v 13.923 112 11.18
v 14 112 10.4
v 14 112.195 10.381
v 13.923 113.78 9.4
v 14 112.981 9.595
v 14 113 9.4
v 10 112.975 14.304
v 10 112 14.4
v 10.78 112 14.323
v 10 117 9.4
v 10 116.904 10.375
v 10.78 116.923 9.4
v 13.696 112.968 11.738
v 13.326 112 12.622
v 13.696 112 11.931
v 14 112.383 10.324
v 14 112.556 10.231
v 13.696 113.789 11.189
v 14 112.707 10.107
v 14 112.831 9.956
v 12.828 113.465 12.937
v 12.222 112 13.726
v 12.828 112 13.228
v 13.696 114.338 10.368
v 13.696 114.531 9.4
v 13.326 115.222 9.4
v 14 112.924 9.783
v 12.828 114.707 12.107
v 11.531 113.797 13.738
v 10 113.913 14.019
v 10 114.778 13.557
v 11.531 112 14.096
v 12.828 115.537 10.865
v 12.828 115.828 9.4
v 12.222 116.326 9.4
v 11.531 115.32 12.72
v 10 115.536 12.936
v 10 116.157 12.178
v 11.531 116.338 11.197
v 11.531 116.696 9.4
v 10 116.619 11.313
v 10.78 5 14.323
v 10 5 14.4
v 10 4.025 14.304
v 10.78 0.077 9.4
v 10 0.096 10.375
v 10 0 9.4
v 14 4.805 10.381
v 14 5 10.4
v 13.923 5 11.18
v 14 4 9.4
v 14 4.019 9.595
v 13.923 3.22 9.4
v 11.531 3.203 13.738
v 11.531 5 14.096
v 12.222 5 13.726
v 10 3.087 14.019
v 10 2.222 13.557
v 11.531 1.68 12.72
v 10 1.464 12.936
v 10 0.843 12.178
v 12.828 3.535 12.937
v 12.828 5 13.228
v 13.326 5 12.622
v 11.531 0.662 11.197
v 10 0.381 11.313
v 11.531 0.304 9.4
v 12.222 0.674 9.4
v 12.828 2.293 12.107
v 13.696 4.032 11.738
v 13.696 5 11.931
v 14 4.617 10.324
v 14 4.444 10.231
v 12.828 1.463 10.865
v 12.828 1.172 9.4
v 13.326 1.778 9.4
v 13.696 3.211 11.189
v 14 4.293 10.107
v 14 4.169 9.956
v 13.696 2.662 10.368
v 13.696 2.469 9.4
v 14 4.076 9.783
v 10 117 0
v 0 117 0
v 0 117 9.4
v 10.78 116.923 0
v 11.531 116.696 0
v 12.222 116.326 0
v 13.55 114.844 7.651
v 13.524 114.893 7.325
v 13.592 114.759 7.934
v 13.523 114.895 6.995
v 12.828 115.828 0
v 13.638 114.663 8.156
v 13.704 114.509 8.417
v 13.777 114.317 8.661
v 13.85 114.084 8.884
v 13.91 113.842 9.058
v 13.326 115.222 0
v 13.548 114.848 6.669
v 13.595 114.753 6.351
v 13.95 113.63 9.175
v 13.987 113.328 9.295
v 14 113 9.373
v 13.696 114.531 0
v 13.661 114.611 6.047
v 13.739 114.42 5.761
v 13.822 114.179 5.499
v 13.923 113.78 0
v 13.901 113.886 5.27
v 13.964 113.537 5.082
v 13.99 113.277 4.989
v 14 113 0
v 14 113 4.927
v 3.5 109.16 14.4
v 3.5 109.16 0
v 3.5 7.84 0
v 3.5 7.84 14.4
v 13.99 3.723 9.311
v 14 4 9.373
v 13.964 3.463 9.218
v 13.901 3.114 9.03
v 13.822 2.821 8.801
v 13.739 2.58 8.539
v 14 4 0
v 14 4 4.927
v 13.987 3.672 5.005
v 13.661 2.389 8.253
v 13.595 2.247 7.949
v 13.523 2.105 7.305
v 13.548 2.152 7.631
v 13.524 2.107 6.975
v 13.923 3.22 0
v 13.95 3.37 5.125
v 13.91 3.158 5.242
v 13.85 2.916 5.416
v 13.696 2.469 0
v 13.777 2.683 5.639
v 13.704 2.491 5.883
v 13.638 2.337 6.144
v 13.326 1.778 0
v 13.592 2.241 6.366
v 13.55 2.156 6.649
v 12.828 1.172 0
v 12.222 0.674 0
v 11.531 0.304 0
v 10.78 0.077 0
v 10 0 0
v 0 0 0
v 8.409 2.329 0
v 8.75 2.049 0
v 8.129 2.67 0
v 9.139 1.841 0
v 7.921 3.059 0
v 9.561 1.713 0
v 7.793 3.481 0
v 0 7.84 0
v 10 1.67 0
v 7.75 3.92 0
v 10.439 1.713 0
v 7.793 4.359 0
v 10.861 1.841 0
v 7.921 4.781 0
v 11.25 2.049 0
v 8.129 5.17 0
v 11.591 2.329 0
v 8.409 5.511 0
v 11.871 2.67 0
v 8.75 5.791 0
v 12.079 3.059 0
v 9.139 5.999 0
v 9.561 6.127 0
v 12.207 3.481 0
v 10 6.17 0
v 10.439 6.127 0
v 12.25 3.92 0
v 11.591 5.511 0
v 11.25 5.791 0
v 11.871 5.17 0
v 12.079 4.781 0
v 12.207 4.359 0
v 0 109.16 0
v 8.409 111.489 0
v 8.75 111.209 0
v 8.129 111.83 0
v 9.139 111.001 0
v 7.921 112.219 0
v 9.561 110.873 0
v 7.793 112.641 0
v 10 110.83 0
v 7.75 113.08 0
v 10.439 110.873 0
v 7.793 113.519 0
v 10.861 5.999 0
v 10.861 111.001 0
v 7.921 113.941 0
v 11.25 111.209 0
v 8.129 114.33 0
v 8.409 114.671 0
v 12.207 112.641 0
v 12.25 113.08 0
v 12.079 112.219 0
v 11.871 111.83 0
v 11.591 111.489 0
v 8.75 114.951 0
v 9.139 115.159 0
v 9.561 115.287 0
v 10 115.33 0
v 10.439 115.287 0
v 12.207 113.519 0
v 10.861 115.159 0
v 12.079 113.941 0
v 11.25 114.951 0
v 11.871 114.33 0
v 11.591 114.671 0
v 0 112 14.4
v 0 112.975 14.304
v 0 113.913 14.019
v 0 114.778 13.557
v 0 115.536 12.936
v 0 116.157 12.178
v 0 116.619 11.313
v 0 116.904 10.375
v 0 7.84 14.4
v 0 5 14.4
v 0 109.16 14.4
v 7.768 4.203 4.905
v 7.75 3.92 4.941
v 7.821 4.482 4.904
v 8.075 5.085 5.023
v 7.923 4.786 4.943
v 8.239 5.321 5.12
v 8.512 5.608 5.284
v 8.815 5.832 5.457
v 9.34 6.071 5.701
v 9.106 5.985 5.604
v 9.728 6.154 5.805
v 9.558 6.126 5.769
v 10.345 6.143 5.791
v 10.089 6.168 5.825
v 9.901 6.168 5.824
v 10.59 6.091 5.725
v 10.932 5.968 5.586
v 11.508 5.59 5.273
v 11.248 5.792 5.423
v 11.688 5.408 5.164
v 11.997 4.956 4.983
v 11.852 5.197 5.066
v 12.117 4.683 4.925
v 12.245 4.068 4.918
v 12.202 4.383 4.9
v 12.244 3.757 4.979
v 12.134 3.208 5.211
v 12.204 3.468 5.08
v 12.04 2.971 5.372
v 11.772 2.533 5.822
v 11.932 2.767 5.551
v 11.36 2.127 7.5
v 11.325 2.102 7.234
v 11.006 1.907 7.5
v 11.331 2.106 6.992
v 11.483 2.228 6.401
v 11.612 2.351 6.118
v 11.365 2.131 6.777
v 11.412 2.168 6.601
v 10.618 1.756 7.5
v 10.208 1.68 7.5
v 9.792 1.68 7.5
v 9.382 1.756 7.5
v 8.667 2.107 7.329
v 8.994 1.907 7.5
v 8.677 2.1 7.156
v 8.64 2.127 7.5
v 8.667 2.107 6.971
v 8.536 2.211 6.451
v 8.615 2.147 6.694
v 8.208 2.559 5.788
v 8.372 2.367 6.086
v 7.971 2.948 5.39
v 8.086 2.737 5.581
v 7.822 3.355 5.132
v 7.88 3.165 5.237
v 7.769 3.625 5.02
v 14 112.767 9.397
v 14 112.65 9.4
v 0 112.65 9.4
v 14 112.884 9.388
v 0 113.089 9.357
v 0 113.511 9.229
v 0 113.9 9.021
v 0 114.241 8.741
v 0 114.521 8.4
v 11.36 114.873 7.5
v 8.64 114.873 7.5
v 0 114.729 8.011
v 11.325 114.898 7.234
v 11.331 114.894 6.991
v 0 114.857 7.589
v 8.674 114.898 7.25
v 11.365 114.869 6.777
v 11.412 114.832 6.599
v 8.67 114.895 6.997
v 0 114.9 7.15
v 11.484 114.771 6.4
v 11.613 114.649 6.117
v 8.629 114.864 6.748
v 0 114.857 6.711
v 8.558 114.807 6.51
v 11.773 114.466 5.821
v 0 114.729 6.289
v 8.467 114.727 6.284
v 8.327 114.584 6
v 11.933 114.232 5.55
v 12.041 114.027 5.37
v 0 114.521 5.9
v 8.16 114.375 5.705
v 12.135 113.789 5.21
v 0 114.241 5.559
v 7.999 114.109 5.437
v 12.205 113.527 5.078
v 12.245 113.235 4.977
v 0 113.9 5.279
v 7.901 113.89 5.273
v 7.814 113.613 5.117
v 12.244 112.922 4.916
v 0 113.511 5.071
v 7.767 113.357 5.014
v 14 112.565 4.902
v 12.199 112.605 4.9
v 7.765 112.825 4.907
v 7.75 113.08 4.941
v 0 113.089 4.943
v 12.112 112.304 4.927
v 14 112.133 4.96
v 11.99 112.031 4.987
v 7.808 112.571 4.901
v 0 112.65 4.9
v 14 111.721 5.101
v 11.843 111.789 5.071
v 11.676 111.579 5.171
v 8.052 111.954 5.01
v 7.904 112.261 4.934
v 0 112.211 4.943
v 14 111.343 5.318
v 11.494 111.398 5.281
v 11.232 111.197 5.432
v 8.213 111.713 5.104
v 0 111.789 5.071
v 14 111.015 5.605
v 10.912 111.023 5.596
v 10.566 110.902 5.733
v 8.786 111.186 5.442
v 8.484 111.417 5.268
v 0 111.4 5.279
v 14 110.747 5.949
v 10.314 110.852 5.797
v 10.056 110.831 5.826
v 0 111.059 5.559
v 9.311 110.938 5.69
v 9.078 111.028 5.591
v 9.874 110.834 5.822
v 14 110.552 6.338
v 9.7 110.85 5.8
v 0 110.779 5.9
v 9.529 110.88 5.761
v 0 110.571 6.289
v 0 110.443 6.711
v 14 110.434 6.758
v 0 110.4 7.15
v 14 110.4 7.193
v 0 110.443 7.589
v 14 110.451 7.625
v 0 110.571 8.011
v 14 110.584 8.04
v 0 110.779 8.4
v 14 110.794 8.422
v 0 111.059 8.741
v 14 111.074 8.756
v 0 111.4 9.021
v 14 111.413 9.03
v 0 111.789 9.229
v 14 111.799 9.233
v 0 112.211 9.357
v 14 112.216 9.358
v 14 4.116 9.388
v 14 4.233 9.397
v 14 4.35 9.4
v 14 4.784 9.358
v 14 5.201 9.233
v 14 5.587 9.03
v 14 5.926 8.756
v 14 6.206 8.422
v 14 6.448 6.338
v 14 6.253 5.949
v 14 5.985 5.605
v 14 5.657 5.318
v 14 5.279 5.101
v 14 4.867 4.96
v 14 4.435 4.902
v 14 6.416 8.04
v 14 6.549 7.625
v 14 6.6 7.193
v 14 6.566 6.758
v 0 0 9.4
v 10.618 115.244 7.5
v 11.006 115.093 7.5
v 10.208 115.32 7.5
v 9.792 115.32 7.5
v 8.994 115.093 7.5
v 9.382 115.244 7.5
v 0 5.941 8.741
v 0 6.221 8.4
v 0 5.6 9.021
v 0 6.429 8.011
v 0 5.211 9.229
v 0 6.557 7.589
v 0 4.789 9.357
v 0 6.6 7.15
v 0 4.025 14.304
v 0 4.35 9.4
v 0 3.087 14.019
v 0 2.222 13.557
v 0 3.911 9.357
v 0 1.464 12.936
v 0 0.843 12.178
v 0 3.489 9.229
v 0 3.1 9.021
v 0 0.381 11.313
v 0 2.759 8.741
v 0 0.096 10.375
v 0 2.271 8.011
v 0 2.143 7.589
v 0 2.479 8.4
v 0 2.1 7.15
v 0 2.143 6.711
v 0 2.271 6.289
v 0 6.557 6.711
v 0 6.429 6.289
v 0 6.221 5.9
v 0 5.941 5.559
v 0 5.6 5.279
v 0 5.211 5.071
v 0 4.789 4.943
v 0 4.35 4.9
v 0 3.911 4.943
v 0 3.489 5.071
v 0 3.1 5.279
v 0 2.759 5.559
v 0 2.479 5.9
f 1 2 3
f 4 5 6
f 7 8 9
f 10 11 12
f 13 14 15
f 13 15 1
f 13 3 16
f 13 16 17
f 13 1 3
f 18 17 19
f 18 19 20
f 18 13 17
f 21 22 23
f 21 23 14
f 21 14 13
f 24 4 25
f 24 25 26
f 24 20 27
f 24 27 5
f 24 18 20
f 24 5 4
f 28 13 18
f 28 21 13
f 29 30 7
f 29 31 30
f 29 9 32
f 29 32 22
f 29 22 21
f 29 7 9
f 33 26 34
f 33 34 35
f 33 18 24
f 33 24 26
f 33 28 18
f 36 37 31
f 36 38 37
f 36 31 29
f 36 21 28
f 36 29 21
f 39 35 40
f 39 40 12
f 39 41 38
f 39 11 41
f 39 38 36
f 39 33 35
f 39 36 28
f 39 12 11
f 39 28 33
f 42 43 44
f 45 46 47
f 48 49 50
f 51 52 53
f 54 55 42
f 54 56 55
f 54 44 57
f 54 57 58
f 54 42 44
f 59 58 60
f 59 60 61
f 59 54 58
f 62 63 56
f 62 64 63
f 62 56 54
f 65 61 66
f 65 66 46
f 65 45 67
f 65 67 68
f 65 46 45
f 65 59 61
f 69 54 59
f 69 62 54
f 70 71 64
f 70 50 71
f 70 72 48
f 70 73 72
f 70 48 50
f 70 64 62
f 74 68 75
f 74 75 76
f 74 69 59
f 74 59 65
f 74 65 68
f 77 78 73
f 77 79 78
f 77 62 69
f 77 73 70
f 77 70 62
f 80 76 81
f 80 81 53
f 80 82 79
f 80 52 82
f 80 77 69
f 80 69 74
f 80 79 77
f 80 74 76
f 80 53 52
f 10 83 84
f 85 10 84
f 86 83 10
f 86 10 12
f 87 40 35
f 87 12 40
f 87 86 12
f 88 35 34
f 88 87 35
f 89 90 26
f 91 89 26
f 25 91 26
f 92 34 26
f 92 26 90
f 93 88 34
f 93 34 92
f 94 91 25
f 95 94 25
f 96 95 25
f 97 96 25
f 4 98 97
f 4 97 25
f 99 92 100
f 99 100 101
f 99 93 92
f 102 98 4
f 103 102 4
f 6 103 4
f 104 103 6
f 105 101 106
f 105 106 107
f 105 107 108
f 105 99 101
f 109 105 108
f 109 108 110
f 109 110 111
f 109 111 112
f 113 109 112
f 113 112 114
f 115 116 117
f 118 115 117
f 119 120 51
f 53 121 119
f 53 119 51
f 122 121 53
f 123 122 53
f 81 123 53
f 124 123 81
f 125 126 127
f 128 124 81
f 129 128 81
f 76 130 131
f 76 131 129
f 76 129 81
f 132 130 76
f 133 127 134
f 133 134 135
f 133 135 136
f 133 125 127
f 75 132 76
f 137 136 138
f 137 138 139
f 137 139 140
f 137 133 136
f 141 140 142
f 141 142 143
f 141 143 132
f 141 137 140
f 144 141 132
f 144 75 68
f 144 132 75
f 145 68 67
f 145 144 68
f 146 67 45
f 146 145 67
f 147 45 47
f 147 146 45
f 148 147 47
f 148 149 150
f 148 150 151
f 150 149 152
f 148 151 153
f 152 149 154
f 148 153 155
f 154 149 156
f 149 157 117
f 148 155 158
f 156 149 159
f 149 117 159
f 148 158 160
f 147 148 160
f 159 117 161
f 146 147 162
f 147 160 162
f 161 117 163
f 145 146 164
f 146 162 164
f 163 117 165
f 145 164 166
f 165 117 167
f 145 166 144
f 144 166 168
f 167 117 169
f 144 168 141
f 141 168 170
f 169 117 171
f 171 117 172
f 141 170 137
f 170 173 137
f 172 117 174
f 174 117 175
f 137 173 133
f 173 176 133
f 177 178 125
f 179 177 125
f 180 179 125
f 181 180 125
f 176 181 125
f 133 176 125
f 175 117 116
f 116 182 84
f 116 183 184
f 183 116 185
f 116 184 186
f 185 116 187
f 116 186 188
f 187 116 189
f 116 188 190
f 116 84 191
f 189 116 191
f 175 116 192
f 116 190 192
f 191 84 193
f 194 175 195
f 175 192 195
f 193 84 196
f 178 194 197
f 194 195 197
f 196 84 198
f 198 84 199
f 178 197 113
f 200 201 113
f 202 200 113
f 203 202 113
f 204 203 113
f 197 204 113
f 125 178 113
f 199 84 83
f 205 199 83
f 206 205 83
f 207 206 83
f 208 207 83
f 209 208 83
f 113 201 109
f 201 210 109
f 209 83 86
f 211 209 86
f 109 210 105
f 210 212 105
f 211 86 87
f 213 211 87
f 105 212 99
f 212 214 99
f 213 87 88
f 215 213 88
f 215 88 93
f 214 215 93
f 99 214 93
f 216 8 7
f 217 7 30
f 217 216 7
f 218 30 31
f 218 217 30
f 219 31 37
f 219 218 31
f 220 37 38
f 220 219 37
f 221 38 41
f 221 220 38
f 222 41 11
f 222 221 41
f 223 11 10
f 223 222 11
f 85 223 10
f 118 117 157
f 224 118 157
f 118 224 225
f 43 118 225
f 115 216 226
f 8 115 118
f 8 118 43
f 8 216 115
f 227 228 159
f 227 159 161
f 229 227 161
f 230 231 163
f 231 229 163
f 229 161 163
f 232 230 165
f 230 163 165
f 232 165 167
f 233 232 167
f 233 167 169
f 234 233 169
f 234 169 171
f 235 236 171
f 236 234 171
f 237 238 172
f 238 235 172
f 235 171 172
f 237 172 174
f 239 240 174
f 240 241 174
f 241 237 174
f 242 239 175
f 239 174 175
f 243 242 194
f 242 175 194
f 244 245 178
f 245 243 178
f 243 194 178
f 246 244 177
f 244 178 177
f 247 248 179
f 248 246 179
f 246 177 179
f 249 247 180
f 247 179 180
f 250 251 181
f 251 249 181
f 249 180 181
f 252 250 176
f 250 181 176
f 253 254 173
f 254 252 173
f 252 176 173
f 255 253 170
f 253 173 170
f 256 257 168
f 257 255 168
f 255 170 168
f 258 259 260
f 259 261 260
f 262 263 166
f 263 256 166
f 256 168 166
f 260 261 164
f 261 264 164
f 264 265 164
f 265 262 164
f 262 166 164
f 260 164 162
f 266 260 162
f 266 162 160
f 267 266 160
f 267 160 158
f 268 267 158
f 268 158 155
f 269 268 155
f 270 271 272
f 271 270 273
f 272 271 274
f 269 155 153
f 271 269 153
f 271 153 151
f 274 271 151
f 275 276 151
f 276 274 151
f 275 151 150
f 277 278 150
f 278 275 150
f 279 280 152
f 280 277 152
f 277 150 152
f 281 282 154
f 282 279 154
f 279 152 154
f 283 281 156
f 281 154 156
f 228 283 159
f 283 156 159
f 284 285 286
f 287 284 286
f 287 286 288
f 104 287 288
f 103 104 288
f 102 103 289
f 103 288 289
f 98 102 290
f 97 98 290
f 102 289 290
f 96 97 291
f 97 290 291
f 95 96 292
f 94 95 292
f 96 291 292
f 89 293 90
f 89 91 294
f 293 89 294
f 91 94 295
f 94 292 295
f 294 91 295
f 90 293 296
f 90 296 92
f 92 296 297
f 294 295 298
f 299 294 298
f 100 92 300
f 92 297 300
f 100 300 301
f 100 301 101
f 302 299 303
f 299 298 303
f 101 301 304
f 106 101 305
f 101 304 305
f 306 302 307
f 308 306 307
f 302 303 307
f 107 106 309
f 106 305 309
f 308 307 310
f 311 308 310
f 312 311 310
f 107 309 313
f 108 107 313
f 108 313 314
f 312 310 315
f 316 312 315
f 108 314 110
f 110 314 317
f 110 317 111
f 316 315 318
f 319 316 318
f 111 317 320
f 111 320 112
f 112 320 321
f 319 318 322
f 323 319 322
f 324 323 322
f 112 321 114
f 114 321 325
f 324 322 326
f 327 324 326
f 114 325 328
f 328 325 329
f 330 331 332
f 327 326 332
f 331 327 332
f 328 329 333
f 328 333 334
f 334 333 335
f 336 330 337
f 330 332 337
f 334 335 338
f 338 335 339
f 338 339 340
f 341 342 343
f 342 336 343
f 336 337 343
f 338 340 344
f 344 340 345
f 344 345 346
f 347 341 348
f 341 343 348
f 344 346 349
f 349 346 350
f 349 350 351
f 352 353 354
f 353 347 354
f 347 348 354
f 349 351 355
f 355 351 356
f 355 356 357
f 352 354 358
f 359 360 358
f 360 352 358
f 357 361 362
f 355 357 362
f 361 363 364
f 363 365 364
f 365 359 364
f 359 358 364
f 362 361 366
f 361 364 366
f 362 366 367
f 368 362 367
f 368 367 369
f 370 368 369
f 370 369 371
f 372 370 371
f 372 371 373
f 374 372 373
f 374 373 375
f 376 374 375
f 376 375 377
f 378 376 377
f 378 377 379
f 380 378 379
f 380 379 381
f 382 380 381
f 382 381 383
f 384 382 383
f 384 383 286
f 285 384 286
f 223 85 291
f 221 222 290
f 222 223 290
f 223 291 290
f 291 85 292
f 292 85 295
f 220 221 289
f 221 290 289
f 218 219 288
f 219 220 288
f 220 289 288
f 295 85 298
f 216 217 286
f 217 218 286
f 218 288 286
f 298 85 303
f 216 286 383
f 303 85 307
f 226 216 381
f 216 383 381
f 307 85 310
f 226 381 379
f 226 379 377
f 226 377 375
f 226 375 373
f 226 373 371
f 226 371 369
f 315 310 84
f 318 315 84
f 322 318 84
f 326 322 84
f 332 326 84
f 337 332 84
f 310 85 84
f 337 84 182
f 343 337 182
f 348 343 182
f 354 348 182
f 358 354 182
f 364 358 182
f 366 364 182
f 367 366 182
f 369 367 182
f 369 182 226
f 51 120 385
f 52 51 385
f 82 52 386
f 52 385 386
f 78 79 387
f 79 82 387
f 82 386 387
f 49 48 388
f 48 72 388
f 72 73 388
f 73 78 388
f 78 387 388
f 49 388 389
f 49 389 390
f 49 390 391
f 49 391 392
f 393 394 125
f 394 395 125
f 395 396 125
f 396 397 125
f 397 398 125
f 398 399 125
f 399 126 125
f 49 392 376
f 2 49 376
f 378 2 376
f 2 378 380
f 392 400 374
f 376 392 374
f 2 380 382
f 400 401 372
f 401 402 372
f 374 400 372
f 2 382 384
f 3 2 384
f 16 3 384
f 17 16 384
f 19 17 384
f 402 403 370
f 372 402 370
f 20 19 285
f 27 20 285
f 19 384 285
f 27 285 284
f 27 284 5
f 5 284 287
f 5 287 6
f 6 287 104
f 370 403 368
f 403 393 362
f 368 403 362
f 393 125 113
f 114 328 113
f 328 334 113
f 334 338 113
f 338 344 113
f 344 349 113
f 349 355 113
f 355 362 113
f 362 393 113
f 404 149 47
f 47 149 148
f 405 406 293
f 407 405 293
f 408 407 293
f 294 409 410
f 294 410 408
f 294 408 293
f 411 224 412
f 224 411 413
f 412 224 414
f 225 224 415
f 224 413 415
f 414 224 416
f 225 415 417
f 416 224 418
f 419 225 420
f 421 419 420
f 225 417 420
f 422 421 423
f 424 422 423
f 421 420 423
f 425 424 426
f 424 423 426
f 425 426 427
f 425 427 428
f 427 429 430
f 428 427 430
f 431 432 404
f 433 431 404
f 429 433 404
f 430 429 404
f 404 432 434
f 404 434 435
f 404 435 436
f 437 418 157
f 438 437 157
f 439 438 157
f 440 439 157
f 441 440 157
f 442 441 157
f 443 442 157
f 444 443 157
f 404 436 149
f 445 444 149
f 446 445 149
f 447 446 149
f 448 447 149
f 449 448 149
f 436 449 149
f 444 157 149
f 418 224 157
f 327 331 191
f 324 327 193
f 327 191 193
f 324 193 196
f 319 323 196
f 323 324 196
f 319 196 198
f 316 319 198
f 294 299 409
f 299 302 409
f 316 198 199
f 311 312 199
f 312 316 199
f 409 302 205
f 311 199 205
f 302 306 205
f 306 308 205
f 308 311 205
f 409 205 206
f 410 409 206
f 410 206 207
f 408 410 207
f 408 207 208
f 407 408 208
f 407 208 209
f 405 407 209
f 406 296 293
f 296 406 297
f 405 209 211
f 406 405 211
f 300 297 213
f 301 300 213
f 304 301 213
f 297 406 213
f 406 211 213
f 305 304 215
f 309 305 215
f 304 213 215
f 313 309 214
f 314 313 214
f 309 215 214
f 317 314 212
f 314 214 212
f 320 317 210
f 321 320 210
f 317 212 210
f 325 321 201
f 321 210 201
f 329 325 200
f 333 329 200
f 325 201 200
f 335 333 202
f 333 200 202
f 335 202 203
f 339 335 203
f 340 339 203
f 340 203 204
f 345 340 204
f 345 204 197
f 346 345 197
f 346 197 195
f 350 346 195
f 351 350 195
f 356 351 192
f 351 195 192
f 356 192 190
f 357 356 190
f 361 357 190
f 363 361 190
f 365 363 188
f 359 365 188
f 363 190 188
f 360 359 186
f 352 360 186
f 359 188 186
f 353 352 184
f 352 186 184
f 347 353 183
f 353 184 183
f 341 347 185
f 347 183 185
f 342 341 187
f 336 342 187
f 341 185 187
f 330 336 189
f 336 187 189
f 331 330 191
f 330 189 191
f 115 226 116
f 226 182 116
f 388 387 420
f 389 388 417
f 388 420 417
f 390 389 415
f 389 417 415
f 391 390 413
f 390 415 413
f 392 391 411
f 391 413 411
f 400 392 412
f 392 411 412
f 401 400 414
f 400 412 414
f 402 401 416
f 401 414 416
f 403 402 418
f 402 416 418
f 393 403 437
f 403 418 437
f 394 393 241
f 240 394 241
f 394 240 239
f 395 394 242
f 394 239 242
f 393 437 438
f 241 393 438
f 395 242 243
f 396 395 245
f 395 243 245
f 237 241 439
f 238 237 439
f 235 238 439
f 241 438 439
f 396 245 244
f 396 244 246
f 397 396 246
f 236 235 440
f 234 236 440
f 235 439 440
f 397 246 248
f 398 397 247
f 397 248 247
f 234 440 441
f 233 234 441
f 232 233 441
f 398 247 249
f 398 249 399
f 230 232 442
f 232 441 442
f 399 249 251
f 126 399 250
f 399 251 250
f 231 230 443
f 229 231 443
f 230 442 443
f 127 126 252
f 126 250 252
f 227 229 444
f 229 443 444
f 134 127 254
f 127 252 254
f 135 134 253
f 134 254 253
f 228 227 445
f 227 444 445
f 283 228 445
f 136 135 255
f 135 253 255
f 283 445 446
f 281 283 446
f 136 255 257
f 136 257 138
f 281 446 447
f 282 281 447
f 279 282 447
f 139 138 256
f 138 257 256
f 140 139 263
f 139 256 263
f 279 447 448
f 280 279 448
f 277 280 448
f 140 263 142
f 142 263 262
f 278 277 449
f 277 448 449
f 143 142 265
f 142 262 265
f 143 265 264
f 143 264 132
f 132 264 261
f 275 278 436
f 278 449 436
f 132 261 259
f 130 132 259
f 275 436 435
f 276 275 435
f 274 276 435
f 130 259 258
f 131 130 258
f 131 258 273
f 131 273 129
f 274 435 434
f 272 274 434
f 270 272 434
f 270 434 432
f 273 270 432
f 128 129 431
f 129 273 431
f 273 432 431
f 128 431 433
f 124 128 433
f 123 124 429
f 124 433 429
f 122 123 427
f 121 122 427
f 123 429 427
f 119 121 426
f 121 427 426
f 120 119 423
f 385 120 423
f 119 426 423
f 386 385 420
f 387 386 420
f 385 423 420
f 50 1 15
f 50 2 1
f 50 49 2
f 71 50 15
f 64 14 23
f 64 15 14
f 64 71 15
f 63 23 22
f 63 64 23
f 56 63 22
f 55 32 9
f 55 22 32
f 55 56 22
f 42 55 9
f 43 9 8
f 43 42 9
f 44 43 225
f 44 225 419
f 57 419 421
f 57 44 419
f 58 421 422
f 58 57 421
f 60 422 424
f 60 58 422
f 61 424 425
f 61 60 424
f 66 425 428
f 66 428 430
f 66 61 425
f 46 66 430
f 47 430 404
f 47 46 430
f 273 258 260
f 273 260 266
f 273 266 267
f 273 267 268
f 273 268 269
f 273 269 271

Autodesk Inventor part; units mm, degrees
ref_plane "YZ Plane" through (0, 0, 0) normal (1, 0, 0) x (0, 1, 0)
ref_plane "XZ Plane" through (0, 0, 0) normal (0, 1, 0) x (-1, 0, 0)
ref_plane "XY Plane" through (0, 0, 0) normal (0, 0, 1) x (1, 0, 0)
sketch "スケッチ1" plane through (0, 0, 0) normal (0, 0, 1) x (1, 0, 0)
  line L0 (0, 0) -> (14, 0)
  line L1 (14, 0) -> (14, 117)
  line L2 (14, 117) -> (0, 117)
  line L3 (0, 117) -> (0, 109.16)
  line L4 (0, 109.16) -> (3.5, 109.16)
  line L5 (3.5, 109.16) -> (3.5, 7.84)
  line L6 (3.5, 7.84) -> (0, 7.84)
  line L7 (0, 7.84) -> (0, 0)
  dimension "d0" = 117
  dimension "d1" = 3.5
  dimension "d2" = 7.84
  dimension "d3" = 14
extrude "押し出し1" add sketch "スケッチ1" along normal blind 14.4
sketch "スケッチ2" plane through (0, 0, 0) normal (-1, 0, 0) x (0, 0, 1)
  line L0 (0, 117) -> (14.4, 117) construction
  line L1 (0, 0) -> (14.4, 0) construction
  line L2 (0, 117) -> (14.4, 117) construction
  line L3 (7.15, 117) -> (7.15, 0) construction
  line L4 (0, 0) -> (14.4, 0) construction
  circle A0 centre (7.15, 4.35) radius 1.8 construction
  line L5 (7.15, 4.35) -> (5.35, 4.35) construction
  line L6 (0, 7.84) -> (0, 0) construction
  circle A1 centre (7.15, 4.35) radius 2.25
  line L7 (7.15, 58.5) -> (14.4, 58.5) construction
  line L8 (14.4, 0) -> (14.4, 117) projected
  circle A2 centre (7.15, 112.65) radius 2.25
  point P0 (7.15, 2.55)
  dimension "d6" = 3.6
  dimension "d7" = 5.35
  dimension "d8" = 2.55
  dimension "d9" = 4.5
extrude "押し出し2" cut sketch "スケッチ2" against normal through all
fillet "フィレット1" radius 5 2 edges at (7, 0, 14.4) (7, 117, 14.4)
sketch "スケッチ3" plane through (0, 0, 0) normal (0, 0, -1) x (-1, 0, 0)
  line L0 (0, 7.84) -> (0, 0) construction
  line L1 (-14, 0) -> (-14, 117) construction
  line L2 (0, 117) -> (0, 109.16) construction
  line L3 (0, 3.92) -> (-14, 3.92) construction
  circle A0 centre (-10, 3.92) radius 2.25
  line L4 (-14, 5) -> (-14, 112) construction
  line L5 (-14, 58.5) -> (-3.7036, 58.5) construction
  circle A1 centre (-10, 113.08) radius 2.25
  dimension "d13" = 7.84
  dimension "d14" = 4.5
  dimension "d17" = 4
extrude "押し出し3" cut sketch "スケッチ3" against normal blind 7.5
fillet "フィレット2" radius 4 5 edges at (14, 1.4645, 12.9355) (14, 58.5, 14.4) (14, 115.5355, 12.9355) (14, 117, 4.7) (14, 0, 4.7)
properties part number "small_gpu_03" material "アルミニウム 6061"
